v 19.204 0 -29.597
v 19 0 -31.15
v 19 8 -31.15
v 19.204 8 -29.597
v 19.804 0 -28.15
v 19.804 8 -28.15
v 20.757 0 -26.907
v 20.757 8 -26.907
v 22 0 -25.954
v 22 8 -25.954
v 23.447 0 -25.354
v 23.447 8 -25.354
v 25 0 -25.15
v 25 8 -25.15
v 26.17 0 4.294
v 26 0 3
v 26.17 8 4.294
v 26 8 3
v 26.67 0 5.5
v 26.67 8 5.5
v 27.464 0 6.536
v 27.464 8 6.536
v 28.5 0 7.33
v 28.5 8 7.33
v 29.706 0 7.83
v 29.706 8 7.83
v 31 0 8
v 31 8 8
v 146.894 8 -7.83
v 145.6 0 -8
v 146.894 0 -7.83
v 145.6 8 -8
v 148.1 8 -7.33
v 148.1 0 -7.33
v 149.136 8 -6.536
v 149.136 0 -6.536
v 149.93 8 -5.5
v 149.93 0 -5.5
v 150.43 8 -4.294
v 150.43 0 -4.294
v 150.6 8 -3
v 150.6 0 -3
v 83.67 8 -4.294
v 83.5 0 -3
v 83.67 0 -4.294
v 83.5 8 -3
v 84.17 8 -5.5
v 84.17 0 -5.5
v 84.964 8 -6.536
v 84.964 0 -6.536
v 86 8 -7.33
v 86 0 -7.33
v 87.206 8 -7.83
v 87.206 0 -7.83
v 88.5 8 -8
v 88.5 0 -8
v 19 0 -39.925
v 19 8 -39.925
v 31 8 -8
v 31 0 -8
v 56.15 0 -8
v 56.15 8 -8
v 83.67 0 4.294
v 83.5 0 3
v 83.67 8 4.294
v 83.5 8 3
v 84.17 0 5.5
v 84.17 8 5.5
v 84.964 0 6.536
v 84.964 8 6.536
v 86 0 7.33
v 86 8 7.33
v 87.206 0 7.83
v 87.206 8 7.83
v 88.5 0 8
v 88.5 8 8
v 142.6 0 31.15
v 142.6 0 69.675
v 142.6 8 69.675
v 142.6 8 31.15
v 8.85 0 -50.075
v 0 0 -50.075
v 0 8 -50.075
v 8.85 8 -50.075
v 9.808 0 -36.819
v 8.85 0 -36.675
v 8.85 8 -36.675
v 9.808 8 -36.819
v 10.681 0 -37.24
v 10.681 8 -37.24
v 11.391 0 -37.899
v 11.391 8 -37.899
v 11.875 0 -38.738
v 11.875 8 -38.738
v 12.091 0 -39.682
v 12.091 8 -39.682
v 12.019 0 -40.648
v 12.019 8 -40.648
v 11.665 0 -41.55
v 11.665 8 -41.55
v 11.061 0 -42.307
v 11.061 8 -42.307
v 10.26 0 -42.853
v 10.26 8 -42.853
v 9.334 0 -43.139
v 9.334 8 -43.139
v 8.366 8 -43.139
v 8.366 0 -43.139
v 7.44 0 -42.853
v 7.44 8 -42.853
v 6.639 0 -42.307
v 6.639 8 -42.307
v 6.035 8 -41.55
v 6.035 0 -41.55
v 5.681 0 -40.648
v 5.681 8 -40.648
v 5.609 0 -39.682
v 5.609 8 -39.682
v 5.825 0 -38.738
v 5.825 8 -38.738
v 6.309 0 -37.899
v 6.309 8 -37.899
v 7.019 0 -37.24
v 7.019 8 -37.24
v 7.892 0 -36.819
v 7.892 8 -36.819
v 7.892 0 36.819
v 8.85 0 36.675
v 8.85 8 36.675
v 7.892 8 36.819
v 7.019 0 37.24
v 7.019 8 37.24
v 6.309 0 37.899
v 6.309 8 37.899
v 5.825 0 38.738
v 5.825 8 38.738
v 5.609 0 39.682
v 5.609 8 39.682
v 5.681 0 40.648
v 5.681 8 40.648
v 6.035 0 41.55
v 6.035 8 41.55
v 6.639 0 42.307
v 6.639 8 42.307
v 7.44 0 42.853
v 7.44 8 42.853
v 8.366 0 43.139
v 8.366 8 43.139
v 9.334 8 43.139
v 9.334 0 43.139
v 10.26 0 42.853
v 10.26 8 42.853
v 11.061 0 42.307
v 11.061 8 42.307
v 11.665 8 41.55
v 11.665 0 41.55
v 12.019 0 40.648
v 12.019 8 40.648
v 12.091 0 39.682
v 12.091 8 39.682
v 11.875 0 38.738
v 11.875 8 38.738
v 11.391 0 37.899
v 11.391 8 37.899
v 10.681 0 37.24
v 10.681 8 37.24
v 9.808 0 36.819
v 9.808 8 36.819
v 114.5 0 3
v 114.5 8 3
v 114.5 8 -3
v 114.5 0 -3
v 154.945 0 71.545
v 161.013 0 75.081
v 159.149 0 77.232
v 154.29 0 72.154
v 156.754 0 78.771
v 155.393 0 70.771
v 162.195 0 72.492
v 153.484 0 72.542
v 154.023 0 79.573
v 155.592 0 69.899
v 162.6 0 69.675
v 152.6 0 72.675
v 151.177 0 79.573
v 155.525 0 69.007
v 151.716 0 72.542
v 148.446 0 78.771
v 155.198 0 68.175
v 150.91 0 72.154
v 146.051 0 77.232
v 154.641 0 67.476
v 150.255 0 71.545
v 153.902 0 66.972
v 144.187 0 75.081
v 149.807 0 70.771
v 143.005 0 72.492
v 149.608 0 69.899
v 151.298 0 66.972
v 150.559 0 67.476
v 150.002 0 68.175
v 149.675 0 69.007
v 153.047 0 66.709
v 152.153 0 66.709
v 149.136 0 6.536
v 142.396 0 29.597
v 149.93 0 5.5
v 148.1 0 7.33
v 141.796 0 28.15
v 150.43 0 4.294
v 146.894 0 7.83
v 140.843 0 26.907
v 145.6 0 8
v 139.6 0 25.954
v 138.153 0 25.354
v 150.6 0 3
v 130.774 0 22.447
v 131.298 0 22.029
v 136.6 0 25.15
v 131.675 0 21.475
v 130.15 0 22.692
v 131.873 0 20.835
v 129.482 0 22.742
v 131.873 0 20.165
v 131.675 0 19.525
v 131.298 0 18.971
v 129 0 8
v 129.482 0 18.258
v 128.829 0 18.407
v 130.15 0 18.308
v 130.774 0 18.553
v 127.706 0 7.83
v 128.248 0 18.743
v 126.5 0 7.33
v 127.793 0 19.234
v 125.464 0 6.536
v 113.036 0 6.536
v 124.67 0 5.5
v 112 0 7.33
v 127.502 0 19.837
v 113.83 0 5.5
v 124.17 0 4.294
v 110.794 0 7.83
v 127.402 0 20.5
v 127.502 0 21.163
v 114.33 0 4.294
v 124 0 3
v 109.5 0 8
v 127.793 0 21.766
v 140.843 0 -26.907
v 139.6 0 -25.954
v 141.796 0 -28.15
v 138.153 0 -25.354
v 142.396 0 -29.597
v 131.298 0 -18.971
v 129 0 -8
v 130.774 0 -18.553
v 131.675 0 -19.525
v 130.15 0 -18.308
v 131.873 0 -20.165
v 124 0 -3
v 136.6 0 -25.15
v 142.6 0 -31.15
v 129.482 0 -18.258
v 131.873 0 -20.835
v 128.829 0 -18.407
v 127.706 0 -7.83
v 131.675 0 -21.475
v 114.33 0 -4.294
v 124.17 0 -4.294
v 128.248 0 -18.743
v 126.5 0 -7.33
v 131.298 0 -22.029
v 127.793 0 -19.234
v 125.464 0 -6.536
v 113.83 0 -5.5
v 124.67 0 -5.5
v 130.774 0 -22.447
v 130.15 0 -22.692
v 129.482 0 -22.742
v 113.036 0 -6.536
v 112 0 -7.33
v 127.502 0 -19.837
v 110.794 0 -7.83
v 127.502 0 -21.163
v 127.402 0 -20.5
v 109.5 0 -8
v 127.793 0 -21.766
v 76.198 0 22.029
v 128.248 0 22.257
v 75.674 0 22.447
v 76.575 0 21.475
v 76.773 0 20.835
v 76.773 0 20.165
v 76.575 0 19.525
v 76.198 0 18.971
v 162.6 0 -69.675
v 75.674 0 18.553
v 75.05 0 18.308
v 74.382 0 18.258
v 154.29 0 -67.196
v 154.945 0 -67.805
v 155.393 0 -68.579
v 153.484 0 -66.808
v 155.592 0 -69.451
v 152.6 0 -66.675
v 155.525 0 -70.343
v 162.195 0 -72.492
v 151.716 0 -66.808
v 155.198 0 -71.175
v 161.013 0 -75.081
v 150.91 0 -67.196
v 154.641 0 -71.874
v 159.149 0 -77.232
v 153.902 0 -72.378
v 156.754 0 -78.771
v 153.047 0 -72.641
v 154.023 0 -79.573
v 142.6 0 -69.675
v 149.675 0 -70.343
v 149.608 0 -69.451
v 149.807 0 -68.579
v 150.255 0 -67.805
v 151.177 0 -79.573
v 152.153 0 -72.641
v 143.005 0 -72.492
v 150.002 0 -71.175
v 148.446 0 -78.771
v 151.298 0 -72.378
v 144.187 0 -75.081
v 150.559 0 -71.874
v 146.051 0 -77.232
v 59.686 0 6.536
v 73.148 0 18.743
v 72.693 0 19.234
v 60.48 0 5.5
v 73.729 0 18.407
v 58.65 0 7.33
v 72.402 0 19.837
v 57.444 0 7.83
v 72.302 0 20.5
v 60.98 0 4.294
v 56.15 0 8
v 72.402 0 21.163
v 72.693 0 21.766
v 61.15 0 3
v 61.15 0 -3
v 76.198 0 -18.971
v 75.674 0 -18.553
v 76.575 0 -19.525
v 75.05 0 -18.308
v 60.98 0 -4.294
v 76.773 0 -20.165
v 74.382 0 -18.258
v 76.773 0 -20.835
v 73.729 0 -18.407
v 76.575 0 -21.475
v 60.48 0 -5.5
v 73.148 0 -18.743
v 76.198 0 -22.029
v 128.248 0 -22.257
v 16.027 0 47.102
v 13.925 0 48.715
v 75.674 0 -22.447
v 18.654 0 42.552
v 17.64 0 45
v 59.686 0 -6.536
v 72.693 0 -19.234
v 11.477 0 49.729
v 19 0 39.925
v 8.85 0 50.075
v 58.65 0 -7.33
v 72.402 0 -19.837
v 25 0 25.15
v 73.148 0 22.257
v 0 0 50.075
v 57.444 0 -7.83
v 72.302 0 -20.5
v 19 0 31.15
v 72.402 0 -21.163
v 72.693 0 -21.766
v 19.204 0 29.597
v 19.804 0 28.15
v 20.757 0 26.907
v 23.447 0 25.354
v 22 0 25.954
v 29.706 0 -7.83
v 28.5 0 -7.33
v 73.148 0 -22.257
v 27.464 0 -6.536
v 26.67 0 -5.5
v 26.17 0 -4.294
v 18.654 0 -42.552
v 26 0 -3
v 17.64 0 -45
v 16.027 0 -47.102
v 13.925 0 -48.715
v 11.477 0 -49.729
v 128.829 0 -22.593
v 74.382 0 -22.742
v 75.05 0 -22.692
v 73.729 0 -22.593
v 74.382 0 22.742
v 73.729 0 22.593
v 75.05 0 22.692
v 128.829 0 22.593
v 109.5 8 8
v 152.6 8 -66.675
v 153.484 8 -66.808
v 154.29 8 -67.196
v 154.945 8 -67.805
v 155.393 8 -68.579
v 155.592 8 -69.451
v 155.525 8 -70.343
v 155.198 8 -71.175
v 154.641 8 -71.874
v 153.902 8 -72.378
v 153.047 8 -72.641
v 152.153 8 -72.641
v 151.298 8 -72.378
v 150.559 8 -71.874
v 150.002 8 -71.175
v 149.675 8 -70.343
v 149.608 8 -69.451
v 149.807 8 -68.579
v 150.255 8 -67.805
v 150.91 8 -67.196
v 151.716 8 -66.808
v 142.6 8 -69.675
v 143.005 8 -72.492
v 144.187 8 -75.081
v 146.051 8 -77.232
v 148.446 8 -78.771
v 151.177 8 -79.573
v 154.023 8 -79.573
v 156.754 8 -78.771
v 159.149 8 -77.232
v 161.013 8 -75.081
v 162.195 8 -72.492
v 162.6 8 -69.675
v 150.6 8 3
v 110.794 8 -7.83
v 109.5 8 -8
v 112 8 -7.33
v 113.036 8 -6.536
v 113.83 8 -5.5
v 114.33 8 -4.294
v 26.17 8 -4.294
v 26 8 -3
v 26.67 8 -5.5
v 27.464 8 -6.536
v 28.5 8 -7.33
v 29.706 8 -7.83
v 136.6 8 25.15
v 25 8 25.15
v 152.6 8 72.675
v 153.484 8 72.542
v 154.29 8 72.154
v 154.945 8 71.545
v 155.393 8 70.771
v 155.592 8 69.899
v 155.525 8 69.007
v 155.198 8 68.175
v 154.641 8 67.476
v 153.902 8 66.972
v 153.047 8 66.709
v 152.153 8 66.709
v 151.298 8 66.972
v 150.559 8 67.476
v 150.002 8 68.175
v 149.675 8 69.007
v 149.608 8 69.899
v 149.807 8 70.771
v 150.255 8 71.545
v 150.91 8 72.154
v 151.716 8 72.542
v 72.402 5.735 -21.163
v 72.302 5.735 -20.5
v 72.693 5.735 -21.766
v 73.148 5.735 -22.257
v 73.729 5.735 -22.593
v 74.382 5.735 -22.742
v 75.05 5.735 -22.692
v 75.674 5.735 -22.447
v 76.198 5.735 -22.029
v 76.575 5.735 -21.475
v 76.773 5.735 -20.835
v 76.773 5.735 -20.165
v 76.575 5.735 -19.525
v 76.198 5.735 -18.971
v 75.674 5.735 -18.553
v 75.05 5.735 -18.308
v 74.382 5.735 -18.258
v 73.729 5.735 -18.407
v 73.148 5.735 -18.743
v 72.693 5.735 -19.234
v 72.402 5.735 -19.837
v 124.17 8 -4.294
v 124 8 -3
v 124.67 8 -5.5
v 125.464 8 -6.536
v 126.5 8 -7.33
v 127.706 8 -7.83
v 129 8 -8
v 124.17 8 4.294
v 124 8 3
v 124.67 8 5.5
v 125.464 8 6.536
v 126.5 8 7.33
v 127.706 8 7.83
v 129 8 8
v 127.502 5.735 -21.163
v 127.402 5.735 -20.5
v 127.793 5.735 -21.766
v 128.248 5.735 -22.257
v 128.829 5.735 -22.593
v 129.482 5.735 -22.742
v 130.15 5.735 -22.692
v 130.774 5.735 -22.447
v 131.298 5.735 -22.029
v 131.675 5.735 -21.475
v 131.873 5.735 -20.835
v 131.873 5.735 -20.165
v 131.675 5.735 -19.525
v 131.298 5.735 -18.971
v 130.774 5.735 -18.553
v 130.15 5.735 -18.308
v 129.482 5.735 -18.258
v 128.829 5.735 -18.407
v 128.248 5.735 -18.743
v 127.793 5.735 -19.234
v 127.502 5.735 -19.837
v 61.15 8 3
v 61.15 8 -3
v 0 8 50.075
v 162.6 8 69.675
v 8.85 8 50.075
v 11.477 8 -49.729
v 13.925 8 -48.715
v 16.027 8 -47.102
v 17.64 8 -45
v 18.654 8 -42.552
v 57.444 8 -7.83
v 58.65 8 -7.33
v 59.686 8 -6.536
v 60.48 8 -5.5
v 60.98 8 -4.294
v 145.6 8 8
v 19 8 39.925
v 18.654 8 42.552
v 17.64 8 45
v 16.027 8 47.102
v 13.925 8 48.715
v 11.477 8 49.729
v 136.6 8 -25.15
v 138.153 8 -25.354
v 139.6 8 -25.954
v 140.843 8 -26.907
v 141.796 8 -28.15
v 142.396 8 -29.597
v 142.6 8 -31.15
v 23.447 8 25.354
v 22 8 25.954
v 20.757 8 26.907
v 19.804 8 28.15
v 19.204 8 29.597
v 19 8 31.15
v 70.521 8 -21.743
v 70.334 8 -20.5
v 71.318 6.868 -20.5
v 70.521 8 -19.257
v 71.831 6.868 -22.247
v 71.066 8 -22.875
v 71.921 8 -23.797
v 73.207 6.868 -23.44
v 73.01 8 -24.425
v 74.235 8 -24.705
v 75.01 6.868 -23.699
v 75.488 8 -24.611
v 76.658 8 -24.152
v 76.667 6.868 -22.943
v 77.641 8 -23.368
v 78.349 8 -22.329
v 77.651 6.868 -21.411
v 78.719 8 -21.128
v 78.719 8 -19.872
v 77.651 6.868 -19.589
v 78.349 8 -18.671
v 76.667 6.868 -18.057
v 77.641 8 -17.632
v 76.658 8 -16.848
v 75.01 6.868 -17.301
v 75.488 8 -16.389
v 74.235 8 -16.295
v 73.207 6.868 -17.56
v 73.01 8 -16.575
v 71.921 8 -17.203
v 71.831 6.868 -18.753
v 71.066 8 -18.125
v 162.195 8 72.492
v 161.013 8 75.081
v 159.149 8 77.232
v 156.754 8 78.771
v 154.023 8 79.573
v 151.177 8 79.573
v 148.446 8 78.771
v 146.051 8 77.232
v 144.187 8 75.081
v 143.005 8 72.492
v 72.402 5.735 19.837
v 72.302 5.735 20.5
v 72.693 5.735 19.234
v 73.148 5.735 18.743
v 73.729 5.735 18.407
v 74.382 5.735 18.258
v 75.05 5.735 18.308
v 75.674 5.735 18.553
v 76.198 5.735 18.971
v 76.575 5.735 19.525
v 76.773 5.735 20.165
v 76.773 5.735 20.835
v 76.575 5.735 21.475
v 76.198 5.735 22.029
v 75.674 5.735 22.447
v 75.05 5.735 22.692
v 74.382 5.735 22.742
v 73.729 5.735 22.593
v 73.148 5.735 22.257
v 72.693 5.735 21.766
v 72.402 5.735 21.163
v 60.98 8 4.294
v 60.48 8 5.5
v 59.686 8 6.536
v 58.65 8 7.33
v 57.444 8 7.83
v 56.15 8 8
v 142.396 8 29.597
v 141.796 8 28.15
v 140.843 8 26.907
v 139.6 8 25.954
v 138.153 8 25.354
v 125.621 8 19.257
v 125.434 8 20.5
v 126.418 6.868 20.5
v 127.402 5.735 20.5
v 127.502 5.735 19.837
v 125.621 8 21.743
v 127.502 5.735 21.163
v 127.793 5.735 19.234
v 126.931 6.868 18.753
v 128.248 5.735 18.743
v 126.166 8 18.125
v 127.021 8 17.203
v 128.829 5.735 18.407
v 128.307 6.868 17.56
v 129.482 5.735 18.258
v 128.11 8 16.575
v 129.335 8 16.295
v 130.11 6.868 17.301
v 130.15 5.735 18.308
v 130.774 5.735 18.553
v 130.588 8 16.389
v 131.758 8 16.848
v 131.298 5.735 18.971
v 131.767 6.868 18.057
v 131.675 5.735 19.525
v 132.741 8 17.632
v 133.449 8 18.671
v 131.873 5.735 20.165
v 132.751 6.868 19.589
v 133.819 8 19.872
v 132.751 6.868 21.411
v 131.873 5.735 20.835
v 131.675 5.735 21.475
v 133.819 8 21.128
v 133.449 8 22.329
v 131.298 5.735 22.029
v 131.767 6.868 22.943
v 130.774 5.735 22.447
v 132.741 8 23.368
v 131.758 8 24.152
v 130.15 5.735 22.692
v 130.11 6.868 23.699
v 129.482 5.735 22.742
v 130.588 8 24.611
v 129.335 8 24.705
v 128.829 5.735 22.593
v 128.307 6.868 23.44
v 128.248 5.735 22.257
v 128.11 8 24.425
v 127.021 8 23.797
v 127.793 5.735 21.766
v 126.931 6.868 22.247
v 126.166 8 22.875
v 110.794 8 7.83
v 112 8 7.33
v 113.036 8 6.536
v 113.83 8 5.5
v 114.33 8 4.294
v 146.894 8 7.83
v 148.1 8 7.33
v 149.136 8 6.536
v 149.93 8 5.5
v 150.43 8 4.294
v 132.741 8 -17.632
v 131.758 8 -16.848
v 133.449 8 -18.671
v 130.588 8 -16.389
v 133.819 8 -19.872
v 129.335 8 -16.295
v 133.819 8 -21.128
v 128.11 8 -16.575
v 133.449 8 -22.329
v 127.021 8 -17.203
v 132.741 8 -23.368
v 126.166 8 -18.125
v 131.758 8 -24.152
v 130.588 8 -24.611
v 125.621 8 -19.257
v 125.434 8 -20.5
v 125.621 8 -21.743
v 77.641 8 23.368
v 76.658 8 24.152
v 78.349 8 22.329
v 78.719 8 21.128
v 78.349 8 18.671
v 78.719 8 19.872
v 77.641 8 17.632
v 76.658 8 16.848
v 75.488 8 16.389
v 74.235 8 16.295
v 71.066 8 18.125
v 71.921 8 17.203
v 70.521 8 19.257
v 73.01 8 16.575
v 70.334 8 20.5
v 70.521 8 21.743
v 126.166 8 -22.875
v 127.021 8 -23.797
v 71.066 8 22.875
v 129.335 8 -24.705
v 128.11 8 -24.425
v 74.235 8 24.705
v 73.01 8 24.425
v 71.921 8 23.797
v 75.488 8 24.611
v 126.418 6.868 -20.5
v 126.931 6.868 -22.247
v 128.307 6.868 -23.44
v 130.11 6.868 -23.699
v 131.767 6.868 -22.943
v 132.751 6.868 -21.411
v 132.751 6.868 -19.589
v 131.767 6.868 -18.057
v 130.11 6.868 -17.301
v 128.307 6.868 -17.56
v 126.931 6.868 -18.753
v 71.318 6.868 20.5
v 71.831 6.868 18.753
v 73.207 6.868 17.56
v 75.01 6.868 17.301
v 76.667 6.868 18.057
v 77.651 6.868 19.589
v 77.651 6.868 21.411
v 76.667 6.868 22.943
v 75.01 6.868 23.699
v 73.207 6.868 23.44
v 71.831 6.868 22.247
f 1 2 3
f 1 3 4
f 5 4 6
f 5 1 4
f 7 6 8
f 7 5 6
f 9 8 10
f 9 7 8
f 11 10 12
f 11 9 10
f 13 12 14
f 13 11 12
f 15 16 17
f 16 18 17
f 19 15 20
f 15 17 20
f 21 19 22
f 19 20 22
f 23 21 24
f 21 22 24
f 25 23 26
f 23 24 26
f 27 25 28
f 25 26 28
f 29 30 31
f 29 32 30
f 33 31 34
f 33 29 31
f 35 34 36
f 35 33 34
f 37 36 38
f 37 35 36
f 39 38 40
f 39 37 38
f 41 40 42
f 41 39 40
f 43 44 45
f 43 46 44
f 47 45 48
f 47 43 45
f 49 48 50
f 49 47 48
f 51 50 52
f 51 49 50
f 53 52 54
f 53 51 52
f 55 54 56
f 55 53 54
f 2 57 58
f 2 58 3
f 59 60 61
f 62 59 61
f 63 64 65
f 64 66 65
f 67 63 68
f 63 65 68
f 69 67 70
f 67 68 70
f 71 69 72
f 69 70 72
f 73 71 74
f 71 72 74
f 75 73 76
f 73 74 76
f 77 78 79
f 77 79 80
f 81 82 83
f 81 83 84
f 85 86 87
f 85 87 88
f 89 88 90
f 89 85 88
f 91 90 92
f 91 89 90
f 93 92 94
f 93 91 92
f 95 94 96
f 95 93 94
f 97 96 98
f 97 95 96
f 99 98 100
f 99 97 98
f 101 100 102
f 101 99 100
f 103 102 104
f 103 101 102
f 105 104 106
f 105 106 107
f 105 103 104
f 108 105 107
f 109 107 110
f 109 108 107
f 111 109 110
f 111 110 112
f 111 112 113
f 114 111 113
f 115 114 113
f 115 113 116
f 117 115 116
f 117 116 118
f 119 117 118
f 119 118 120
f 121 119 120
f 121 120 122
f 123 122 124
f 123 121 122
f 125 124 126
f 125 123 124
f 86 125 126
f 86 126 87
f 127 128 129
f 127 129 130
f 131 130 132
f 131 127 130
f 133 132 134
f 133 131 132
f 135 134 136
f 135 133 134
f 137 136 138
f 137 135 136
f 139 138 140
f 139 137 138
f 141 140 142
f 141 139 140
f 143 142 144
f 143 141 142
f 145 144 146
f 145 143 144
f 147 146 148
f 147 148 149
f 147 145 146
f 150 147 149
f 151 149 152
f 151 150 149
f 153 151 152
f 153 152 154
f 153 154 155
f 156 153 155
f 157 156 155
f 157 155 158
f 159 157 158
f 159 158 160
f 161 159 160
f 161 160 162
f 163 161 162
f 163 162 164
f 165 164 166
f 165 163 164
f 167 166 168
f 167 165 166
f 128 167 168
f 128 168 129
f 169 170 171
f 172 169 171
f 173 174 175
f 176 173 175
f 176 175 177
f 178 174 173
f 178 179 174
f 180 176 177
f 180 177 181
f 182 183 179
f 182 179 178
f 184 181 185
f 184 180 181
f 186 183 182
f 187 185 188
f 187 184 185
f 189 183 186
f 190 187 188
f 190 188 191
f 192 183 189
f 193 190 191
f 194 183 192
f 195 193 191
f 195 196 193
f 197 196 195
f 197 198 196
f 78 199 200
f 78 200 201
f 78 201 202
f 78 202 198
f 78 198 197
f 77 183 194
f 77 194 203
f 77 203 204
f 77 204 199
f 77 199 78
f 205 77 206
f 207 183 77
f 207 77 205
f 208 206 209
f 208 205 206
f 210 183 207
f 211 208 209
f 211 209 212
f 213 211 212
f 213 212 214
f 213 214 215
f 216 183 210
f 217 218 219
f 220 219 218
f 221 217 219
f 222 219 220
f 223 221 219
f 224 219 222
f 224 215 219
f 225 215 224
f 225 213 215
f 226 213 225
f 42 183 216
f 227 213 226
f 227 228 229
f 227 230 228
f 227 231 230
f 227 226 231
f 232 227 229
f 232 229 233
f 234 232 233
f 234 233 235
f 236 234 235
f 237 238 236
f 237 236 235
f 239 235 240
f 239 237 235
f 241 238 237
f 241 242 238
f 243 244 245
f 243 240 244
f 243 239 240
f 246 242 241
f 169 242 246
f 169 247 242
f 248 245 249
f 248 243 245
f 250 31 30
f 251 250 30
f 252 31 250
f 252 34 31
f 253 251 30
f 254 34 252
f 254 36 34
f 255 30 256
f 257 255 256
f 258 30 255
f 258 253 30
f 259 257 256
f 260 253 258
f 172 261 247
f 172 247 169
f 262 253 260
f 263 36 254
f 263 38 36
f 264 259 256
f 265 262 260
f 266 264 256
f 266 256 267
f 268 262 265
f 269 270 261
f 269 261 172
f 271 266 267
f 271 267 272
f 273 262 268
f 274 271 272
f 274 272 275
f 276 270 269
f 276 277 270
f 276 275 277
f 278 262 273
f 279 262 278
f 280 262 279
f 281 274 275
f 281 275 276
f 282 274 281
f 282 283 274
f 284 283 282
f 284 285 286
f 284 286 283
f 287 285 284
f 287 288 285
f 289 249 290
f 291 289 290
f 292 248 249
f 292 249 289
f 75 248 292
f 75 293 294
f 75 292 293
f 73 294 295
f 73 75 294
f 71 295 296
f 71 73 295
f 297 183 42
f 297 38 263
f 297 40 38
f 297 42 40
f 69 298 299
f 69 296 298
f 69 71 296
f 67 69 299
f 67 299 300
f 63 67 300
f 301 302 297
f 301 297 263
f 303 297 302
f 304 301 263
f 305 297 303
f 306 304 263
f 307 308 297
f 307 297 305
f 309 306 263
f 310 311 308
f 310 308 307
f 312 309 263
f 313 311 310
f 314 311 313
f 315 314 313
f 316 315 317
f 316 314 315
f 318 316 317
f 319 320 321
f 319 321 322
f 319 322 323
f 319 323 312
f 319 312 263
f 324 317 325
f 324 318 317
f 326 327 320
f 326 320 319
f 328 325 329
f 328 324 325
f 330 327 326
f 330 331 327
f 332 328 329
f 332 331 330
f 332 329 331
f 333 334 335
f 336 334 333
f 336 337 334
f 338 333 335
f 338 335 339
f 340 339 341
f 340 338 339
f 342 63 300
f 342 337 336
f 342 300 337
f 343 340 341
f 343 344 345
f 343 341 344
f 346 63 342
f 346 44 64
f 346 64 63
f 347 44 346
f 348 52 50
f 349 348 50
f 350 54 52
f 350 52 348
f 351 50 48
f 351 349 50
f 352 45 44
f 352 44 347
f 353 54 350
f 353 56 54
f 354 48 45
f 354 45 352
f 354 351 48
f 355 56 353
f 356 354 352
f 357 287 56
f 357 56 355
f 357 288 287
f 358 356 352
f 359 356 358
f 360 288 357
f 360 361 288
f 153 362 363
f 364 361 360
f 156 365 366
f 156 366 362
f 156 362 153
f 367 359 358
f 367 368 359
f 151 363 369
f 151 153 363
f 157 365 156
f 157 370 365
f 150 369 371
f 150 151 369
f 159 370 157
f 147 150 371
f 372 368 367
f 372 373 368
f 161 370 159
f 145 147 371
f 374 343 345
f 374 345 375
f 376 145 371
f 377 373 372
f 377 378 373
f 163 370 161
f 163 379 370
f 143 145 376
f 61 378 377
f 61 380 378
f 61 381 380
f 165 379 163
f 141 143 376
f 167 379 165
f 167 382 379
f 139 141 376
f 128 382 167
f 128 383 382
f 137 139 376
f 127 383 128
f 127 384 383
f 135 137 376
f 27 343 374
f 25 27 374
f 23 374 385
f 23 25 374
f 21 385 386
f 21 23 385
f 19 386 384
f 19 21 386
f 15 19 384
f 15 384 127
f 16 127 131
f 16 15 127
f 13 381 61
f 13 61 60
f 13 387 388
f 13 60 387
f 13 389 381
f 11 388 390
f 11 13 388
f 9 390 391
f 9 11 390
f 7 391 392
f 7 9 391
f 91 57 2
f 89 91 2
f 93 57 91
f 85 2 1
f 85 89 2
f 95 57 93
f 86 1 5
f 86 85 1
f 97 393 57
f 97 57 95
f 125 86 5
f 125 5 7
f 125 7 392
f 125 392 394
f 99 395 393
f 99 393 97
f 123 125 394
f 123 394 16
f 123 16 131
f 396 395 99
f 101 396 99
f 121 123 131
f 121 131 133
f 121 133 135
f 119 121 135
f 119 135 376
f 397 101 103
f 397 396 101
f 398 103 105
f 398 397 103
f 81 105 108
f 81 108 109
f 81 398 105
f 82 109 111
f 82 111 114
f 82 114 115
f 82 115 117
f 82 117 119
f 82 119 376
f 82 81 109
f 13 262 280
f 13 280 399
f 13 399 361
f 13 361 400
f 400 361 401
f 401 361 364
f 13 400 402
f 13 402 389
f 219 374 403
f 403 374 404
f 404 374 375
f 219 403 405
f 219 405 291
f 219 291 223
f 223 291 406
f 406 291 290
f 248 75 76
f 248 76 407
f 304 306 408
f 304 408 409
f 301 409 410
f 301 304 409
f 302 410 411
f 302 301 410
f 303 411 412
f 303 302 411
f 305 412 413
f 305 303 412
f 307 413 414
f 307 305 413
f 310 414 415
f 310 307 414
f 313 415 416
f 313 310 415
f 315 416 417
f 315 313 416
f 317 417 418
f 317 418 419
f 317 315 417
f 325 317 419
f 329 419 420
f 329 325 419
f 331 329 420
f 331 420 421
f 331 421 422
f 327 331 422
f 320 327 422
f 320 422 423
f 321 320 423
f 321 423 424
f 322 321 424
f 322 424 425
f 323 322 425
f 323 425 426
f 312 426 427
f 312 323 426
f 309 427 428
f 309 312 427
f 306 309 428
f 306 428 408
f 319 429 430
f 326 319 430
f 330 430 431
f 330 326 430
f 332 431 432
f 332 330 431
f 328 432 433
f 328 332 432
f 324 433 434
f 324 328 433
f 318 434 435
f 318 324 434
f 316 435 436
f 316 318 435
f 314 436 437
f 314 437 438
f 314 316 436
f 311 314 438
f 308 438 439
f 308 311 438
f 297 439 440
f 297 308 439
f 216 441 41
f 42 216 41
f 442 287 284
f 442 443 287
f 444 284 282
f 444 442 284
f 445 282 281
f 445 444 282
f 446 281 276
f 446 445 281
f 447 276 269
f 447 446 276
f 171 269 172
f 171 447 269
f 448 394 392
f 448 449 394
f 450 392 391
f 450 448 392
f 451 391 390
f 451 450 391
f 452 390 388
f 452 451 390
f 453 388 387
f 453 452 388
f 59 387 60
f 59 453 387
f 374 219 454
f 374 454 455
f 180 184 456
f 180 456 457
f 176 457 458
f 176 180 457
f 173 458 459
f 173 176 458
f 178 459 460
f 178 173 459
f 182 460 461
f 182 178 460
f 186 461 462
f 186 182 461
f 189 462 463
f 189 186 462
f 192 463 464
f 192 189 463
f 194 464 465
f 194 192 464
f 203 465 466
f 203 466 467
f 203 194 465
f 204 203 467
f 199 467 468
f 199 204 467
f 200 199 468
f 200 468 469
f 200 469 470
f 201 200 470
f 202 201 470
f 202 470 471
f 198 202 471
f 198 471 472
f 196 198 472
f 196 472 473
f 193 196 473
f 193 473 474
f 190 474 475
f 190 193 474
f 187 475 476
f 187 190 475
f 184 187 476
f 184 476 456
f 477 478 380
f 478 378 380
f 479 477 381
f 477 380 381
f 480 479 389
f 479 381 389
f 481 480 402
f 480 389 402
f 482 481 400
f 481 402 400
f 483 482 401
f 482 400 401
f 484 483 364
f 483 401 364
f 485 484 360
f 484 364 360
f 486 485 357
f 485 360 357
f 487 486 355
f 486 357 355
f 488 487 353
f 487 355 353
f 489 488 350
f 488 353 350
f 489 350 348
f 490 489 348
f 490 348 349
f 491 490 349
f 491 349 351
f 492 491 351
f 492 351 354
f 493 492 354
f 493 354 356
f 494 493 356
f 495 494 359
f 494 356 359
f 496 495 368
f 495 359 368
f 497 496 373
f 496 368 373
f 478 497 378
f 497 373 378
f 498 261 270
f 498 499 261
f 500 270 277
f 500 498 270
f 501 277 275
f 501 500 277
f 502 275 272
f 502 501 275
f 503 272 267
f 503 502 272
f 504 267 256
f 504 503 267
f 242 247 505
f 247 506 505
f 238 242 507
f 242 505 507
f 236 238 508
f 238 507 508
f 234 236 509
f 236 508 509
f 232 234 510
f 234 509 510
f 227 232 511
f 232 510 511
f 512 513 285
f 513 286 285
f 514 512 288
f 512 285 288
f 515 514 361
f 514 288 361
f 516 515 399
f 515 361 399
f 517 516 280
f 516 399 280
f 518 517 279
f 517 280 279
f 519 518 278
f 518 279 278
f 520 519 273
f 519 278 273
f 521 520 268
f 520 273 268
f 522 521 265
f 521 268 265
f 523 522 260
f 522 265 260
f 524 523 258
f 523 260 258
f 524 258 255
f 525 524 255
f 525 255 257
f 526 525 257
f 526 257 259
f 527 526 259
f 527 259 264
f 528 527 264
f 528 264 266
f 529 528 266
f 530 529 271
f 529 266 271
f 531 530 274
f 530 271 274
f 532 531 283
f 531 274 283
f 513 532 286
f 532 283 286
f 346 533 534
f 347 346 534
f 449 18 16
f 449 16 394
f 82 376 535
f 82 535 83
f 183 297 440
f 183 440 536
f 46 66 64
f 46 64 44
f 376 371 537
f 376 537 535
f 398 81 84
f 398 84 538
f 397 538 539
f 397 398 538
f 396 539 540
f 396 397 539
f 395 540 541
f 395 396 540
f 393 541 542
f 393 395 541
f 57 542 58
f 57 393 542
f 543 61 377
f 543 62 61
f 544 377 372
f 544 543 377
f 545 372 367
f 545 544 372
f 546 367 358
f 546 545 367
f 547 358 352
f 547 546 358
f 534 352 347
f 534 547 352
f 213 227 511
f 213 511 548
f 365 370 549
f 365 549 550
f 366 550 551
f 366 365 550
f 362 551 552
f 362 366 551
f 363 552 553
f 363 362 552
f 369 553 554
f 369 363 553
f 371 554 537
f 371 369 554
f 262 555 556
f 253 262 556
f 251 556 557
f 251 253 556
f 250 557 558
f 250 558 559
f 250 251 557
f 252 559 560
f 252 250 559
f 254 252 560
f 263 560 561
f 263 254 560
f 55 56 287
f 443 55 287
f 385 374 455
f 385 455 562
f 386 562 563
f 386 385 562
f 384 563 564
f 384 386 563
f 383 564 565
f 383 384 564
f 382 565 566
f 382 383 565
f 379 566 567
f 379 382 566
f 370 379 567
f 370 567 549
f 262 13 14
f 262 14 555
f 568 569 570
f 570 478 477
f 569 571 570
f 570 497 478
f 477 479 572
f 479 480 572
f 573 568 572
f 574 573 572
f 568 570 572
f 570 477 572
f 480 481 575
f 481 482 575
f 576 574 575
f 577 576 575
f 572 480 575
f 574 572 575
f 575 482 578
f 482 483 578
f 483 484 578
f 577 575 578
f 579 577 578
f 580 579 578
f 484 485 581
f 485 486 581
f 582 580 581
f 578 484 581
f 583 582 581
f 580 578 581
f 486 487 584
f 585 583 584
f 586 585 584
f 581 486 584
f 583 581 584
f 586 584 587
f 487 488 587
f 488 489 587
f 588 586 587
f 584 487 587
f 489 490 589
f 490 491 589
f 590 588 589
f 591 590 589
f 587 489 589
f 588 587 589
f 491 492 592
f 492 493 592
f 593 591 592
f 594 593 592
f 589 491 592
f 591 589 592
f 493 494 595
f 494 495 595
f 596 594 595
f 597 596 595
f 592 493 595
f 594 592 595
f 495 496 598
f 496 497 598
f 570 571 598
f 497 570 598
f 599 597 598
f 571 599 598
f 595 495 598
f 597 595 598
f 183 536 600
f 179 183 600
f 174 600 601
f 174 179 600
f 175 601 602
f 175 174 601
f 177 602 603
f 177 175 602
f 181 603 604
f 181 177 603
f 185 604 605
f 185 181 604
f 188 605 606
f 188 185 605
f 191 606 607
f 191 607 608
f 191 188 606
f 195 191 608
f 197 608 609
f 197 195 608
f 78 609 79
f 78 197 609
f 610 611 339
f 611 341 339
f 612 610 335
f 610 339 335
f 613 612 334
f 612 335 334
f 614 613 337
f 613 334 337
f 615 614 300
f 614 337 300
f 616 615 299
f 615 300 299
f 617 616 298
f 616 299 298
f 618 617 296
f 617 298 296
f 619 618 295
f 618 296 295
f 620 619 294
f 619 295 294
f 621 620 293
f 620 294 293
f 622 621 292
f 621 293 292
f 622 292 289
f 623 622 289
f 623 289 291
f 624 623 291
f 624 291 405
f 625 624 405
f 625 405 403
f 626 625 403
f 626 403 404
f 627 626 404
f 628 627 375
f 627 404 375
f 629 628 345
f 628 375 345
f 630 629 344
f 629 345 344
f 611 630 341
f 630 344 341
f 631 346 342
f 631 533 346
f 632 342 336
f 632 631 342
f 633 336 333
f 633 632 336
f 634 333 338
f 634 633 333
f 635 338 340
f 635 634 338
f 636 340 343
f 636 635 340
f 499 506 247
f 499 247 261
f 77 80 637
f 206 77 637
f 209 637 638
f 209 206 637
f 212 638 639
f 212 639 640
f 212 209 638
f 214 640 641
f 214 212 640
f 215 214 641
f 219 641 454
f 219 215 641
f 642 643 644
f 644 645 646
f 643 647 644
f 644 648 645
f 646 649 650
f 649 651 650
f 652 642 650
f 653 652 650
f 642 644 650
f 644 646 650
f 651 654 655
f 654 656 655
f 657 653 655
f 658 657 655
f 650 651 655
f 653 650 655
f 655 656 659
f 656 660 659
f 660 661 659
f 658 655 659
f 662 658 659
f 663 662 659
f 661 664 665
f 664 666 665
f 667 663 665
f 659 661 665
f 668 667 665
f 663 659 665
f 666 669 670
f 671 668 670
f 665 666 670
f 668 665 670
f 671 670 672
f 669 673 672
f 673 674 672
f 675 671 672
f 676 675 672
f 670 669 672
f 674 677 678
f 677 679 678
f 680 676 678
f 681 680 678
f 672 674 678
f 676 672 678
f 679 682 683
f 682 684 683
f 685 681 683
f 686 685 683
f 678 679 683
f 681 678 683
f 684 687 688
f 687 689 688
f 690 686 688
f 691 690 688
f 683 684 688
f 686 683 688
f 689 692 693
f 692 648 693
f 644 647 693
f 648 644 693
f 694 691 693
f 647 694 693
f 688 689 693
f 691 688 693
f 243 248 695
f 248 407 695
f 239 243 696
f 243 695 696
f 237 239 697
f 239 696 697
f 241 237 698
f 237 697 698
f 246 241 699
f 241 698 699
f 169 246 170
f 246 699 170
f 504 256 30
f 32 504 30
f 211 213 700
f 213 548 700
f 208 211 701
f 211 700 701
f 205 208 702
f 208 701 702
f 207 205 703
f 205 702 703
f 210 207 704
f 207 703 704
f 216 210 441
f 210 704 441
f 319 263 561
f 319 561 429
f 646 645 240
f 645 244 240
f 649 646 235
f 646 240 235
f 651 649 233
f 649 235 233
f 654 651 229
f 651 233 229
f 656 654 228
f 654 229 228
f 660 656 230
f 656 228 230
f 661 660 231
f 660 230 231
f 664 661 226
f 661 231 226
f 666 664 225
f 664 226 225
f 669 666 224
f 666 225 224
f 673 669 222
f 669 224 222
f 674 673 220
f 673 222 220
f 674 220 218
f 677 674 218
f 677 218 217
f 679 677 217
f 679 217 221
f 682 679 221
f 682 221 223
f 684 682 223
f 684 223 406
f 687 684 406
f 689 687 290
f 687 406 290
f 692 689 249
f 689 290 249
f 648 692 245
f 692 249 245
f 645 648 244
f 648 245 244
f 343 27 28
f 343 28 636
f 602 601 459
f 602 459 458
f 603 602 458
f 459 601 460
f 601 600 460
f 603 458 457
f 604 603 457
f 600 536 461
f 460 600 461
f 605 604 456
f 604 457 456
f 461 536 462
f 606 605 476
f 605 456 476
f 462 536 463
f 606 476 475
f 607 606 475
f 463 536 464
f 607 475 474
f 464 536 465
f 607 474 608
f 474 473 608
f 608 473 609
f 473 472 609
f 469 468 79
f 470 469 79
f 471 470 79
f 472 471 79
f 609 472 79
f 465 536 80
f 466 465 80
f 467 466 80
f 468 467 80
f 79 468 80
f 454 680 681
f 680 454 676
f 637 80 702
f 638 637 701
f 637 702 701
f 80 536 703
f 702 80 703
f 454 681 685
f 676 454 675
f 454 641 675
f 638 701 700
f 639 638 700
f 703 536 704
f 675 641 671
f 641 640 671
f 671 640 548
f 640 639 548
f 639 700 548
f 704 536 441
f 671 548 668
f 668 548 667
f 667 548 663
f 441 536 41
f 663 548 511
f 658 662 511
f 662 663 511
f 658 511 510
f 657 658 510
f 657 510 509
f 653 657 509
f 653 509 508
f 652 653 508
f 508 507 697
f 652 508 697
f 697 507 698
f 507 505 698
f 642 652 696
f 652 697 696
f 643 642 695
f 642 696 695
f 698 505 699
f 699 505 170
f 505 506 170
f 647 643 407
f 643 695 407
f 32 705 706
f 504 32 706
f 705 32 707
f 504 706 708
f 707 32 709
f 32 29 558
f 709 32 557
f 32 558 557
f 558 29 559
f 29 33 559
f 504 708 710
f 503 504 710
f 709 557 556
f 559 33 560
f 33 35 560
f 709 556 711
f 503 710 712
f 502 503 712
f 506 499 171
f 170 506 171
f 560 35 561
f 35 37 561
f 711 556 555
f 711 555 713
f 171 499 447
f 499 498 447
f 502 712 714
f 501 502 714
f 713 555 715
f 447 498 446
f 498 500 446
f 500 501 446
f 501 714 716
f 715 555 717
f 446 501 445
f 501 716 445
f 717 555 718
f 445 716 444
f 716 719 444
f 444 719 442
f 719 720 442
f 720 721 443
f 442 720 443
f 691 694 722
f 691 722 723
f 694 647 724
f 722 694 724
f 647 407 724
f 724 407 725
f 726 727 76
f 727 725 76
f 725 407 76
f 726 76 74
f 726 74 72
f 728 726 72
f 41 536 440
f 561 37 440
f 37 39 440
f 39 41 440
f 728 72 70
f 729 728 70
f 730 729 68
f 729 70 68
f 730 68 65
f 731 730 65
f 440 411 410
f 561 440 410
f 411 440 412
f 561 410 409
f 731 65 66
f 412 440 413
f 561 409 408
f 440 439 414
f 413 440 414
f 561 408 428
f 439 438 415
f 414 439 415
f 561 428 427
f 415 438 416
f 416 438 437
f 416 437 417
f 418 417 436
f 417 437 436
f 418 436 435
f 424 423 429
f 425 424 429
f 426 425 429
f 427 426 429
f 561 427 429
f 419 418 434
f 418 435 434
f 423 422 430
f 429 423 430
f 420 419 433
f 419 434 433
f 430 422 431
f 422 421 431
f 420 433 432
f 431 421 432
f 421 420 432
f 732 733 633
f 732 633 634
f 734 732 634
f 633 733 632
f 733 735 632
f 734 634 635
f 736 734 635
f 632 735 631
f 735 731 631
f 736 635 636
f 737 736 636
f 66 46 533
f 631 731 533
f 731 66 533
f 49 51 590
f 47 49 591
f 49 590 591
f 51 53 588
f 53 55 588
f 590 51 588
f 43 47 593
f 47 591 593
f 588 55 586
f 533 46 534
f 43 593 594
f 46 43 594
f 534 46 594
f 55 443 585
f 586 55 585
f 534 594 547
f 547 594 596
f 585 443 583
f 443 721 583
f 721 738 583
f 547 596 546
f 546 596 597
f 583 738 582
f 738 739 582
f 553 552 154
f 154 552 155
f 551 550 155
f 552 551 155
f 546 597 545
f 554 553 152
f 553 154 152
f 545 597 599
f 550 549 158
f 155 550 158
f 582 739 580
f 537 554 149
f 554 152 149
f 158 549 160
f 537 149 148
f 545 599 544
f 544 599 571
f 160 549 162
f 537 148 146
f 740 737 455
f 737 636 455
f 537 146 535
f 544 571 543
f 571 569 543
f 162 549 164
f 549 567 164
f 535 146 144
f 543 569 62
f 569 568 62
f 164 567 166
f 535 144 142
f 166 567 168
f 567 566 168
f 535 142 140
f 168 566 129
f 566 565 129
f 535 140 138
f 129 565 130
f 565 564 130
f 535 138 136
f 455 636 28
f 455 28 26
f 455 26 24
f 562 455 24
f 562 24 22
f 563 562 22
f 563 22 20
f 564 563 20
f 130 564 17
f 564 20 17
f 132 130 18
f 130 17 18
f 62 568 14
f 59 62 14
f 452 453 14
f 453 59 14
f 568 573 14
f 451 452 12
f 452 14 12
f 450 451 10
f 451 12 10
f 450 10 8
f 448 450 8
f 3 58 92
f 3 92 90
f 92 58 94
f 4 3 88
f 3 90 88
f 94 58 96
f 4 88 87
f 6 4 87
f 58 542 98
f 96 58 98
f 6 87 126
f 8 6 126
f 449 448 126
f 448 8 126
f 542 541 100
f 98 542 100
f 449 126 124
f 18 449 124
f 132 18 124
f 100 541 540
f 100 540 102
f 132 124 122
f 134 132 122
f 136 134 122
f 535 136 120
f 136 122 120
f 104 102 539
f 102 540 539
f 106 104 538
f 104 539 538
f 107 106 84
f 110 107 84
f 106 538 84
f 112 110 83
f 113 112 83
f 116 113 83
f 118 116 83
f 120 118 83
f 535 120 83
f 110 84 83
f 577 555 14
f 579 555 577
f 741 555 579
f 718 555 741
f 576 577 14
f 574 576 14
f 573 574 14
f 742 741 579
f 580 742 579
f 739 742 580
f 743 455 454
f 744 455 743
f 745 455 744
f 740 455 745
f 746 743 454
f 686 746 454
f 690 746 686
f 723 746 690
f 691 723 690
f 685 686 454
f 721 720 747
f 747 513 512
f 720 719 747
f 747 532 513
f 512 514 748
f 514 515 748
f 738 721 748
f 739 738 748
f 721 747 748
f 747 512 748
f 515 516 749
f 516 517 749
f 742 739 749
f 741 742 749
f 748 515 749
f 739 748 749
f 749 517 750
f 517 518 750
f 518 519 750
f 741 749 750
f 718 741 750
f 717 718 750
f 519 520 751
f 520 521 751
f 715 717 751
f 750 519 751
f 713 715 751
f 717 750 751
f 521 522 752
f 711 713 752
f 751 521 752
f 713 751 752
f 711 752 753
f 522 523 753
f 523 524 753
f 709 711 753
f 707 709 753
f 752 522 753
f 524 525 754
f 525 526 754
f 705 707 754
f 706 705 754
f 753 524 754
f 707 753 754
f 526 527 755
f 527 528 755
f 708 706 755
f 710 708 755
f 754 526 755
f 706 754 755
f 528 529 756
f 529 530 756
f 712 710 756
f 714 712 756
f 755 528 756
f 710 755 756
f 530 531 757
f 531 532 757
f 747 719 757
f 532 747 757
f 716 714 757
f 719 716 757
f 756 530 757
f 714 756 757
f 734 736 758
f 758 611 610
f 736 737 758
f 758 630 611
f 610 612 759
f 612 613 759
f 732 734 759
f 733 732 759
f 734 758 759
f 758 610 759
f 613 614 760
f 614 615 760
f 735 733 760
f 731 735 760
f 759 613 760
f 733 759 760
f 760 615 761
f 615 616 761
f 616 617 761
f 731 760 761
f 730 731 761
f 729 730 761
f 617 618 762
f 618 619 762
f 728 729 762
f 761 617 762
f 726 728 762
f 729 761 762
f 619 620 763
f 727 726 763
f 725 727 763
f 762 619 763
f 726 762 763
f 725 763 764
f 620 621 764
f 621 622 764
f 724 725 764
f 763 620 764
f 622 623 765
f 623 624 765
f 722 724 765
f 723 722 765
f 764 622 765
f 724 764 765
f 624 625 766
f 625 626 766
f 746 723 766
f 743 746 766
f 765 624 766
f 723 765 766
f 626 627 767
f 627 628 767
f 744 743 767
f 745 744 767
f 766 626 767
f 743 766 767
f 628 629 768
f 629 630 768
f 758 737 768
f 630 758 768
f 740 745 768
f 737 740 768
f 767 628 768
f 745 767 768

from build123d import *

# Parameters (mm, degrees)
CROQUIS1_R                                           = 3
CROQUIS1_R_2                                         = 3.25
CROQUIS1_W                                           = 26.6
CROQUIS1_H                                           = 16
CROQUIS1_W_2                                         = 31
CROQUIS1_W_3                                         = 35.15
SALIENTE_EXTRUIR1_DEPTH                              = 8
REDONDEO3_R                                          = 5
AVELLANADO_PARA_TORNILLO_CON_CABEZA_OVAL_D           = 4.4958
AVELLANADO_PARA_TORNILLO_CON_CABEZA_OVAL_CSINK_D     = 8.4328
AVELLANADO_PARA_TORNILLO_CON_CABEZA_OVAL_CSINK_ANGLE = 82


with BuildPart() as part:
    # Croquis1 → Saliente-Extruir1 (new body)
    with BuildSketch(Plane(origin=(0, 0, 0), x_dir=(1, 0, 0), z_dir=(0, 1, 0))):
        with BuildLine():
            Line((0, -50.075), (0, 50.075))
            Line((0, 50.075), (8.85, 50.075))
            ThreePointArc((8.85, 50.075), (16.027133829, 47.102133829), (19, 39.925))
            Line((19, 39.925), (19, 31.15))
            ThreePointArc((19, 31.15), (20.757359313, 26.907359313), (25, 25.15))
            Line((25, 25.15), (136.6, 25.15))
            ThreePointArc((136.6, 25.15), (140.842640687, 26.907359313), (142.6, 31.15))
            Line((142.6, 31.15), (142.6, 69.675))
            ThreePointArc((142.6, 69.675), (152.6, 79.675), (162.6, 69.675))
            Line((162.6, 69.675), (162.6, -69.675))
            ThreePointArc((162.6, -69.675), (152.6, -79.675), (142.6, -69.675))
            Line((142.6, -69.675), (142.6, -31.15))
            ThreePointArc((142.6, -31.15), (140.842640687, -26.907359313), (136.6, -25.15))
            Line((136.6, -25.15), (25, -25.15))
            ThreePointArc((25, -25.15), (20.757359313, -26.907359313), (19, -31.15))
            Line((19, -31.15), (19, -39.925))
            ThreePointArc((19, -39.925), (16.027133829, -47.102133829), (8.85, -50.075))
            Line((8.85, -50.075), (0, -50.075))
        make_face()
        with Locations(Location((152.6, 69.675, 0), (0, 0, 270))):
            Circle(CROQUIS1_R, mode=Mode.SUBTRACT)
        with Locations(Location((152.6, -69.675, 0), (0, 0, 270))):
            Circle(CROQUIS1_R, mode=Mode.SUBTRACT)
        with Locations(Location((8.85, 39.925, 0), (0, 0, 270))):
            Circle(CROQUIS1_R_2, mode=Mode.SUBTRACT)
        with Locations(Location((8.85, -39.925, 0), (0, 0, 90))):
            Circle(CROQUIS1_R_2, mode=Mode.SUBTRACT)
        with Locations((137.3, 0)):
            Rectangle(CROQUIS1_W, CROQUIS1_H, mode=Mode.SUBTRACT)
        with Locations((99, 0)):
            Rectangle(CROQUIS1_W_2, CROQUIS1_H, mode=Mode.SUBTRACT)
        with Locations((43.575, 0)):
            Rectangle(CROQUIS1_W_3, CROQUIS1_H, mode=Mode.SUBTRACT)
    extrude(amount=SALIENTE_EXTRUIR1_DEPTH)

    # Redondeo3
    redondeo3_edges = [part.edges().sort_by_distance(p)[0] for p in [
        (83.5, 4, -8),
        (83.5, 4, 8),
        (114.5, 4, 8),
        (114.5, 4, -8),
        (124, 4, -8),
        (124, 4, 8),
        (150.6, 4, 8),
        (150.6, 4, -8),
        (26, 4, -8),
        (26, 4, 8),
        (61.15, 4, 8),
        (61.15, 4, -8),
    ]]
    fillet(redondeo3_edges, radius=REDONDEO3_R)

    # Avellanado para tornillo con cabeza ovalada de #81 (through all)
    with Locations(Plane(origin=(0, 8, 0), x_dir=(1, 0, 0), z_dir=(0, 1, 0))):
        with Locations((74.55, 20.5), (129.65, 20.5), (74.55, -20.5), (129.65, -20.5)):
            CounterSinkHole(AVELLANADO_PARA_TORNILLO_CON_CABEZA_OVAL_D / 2, AVELLANADO_PARA_TORNILLO_CON_CABEZA_OVAL_CSINK_D / 2, counter_sink_angle=AVELLANADO_PARA_TORNILLO_CON_CABEZA_OVAL_CSINK_ANGLE)


solid = part.part
